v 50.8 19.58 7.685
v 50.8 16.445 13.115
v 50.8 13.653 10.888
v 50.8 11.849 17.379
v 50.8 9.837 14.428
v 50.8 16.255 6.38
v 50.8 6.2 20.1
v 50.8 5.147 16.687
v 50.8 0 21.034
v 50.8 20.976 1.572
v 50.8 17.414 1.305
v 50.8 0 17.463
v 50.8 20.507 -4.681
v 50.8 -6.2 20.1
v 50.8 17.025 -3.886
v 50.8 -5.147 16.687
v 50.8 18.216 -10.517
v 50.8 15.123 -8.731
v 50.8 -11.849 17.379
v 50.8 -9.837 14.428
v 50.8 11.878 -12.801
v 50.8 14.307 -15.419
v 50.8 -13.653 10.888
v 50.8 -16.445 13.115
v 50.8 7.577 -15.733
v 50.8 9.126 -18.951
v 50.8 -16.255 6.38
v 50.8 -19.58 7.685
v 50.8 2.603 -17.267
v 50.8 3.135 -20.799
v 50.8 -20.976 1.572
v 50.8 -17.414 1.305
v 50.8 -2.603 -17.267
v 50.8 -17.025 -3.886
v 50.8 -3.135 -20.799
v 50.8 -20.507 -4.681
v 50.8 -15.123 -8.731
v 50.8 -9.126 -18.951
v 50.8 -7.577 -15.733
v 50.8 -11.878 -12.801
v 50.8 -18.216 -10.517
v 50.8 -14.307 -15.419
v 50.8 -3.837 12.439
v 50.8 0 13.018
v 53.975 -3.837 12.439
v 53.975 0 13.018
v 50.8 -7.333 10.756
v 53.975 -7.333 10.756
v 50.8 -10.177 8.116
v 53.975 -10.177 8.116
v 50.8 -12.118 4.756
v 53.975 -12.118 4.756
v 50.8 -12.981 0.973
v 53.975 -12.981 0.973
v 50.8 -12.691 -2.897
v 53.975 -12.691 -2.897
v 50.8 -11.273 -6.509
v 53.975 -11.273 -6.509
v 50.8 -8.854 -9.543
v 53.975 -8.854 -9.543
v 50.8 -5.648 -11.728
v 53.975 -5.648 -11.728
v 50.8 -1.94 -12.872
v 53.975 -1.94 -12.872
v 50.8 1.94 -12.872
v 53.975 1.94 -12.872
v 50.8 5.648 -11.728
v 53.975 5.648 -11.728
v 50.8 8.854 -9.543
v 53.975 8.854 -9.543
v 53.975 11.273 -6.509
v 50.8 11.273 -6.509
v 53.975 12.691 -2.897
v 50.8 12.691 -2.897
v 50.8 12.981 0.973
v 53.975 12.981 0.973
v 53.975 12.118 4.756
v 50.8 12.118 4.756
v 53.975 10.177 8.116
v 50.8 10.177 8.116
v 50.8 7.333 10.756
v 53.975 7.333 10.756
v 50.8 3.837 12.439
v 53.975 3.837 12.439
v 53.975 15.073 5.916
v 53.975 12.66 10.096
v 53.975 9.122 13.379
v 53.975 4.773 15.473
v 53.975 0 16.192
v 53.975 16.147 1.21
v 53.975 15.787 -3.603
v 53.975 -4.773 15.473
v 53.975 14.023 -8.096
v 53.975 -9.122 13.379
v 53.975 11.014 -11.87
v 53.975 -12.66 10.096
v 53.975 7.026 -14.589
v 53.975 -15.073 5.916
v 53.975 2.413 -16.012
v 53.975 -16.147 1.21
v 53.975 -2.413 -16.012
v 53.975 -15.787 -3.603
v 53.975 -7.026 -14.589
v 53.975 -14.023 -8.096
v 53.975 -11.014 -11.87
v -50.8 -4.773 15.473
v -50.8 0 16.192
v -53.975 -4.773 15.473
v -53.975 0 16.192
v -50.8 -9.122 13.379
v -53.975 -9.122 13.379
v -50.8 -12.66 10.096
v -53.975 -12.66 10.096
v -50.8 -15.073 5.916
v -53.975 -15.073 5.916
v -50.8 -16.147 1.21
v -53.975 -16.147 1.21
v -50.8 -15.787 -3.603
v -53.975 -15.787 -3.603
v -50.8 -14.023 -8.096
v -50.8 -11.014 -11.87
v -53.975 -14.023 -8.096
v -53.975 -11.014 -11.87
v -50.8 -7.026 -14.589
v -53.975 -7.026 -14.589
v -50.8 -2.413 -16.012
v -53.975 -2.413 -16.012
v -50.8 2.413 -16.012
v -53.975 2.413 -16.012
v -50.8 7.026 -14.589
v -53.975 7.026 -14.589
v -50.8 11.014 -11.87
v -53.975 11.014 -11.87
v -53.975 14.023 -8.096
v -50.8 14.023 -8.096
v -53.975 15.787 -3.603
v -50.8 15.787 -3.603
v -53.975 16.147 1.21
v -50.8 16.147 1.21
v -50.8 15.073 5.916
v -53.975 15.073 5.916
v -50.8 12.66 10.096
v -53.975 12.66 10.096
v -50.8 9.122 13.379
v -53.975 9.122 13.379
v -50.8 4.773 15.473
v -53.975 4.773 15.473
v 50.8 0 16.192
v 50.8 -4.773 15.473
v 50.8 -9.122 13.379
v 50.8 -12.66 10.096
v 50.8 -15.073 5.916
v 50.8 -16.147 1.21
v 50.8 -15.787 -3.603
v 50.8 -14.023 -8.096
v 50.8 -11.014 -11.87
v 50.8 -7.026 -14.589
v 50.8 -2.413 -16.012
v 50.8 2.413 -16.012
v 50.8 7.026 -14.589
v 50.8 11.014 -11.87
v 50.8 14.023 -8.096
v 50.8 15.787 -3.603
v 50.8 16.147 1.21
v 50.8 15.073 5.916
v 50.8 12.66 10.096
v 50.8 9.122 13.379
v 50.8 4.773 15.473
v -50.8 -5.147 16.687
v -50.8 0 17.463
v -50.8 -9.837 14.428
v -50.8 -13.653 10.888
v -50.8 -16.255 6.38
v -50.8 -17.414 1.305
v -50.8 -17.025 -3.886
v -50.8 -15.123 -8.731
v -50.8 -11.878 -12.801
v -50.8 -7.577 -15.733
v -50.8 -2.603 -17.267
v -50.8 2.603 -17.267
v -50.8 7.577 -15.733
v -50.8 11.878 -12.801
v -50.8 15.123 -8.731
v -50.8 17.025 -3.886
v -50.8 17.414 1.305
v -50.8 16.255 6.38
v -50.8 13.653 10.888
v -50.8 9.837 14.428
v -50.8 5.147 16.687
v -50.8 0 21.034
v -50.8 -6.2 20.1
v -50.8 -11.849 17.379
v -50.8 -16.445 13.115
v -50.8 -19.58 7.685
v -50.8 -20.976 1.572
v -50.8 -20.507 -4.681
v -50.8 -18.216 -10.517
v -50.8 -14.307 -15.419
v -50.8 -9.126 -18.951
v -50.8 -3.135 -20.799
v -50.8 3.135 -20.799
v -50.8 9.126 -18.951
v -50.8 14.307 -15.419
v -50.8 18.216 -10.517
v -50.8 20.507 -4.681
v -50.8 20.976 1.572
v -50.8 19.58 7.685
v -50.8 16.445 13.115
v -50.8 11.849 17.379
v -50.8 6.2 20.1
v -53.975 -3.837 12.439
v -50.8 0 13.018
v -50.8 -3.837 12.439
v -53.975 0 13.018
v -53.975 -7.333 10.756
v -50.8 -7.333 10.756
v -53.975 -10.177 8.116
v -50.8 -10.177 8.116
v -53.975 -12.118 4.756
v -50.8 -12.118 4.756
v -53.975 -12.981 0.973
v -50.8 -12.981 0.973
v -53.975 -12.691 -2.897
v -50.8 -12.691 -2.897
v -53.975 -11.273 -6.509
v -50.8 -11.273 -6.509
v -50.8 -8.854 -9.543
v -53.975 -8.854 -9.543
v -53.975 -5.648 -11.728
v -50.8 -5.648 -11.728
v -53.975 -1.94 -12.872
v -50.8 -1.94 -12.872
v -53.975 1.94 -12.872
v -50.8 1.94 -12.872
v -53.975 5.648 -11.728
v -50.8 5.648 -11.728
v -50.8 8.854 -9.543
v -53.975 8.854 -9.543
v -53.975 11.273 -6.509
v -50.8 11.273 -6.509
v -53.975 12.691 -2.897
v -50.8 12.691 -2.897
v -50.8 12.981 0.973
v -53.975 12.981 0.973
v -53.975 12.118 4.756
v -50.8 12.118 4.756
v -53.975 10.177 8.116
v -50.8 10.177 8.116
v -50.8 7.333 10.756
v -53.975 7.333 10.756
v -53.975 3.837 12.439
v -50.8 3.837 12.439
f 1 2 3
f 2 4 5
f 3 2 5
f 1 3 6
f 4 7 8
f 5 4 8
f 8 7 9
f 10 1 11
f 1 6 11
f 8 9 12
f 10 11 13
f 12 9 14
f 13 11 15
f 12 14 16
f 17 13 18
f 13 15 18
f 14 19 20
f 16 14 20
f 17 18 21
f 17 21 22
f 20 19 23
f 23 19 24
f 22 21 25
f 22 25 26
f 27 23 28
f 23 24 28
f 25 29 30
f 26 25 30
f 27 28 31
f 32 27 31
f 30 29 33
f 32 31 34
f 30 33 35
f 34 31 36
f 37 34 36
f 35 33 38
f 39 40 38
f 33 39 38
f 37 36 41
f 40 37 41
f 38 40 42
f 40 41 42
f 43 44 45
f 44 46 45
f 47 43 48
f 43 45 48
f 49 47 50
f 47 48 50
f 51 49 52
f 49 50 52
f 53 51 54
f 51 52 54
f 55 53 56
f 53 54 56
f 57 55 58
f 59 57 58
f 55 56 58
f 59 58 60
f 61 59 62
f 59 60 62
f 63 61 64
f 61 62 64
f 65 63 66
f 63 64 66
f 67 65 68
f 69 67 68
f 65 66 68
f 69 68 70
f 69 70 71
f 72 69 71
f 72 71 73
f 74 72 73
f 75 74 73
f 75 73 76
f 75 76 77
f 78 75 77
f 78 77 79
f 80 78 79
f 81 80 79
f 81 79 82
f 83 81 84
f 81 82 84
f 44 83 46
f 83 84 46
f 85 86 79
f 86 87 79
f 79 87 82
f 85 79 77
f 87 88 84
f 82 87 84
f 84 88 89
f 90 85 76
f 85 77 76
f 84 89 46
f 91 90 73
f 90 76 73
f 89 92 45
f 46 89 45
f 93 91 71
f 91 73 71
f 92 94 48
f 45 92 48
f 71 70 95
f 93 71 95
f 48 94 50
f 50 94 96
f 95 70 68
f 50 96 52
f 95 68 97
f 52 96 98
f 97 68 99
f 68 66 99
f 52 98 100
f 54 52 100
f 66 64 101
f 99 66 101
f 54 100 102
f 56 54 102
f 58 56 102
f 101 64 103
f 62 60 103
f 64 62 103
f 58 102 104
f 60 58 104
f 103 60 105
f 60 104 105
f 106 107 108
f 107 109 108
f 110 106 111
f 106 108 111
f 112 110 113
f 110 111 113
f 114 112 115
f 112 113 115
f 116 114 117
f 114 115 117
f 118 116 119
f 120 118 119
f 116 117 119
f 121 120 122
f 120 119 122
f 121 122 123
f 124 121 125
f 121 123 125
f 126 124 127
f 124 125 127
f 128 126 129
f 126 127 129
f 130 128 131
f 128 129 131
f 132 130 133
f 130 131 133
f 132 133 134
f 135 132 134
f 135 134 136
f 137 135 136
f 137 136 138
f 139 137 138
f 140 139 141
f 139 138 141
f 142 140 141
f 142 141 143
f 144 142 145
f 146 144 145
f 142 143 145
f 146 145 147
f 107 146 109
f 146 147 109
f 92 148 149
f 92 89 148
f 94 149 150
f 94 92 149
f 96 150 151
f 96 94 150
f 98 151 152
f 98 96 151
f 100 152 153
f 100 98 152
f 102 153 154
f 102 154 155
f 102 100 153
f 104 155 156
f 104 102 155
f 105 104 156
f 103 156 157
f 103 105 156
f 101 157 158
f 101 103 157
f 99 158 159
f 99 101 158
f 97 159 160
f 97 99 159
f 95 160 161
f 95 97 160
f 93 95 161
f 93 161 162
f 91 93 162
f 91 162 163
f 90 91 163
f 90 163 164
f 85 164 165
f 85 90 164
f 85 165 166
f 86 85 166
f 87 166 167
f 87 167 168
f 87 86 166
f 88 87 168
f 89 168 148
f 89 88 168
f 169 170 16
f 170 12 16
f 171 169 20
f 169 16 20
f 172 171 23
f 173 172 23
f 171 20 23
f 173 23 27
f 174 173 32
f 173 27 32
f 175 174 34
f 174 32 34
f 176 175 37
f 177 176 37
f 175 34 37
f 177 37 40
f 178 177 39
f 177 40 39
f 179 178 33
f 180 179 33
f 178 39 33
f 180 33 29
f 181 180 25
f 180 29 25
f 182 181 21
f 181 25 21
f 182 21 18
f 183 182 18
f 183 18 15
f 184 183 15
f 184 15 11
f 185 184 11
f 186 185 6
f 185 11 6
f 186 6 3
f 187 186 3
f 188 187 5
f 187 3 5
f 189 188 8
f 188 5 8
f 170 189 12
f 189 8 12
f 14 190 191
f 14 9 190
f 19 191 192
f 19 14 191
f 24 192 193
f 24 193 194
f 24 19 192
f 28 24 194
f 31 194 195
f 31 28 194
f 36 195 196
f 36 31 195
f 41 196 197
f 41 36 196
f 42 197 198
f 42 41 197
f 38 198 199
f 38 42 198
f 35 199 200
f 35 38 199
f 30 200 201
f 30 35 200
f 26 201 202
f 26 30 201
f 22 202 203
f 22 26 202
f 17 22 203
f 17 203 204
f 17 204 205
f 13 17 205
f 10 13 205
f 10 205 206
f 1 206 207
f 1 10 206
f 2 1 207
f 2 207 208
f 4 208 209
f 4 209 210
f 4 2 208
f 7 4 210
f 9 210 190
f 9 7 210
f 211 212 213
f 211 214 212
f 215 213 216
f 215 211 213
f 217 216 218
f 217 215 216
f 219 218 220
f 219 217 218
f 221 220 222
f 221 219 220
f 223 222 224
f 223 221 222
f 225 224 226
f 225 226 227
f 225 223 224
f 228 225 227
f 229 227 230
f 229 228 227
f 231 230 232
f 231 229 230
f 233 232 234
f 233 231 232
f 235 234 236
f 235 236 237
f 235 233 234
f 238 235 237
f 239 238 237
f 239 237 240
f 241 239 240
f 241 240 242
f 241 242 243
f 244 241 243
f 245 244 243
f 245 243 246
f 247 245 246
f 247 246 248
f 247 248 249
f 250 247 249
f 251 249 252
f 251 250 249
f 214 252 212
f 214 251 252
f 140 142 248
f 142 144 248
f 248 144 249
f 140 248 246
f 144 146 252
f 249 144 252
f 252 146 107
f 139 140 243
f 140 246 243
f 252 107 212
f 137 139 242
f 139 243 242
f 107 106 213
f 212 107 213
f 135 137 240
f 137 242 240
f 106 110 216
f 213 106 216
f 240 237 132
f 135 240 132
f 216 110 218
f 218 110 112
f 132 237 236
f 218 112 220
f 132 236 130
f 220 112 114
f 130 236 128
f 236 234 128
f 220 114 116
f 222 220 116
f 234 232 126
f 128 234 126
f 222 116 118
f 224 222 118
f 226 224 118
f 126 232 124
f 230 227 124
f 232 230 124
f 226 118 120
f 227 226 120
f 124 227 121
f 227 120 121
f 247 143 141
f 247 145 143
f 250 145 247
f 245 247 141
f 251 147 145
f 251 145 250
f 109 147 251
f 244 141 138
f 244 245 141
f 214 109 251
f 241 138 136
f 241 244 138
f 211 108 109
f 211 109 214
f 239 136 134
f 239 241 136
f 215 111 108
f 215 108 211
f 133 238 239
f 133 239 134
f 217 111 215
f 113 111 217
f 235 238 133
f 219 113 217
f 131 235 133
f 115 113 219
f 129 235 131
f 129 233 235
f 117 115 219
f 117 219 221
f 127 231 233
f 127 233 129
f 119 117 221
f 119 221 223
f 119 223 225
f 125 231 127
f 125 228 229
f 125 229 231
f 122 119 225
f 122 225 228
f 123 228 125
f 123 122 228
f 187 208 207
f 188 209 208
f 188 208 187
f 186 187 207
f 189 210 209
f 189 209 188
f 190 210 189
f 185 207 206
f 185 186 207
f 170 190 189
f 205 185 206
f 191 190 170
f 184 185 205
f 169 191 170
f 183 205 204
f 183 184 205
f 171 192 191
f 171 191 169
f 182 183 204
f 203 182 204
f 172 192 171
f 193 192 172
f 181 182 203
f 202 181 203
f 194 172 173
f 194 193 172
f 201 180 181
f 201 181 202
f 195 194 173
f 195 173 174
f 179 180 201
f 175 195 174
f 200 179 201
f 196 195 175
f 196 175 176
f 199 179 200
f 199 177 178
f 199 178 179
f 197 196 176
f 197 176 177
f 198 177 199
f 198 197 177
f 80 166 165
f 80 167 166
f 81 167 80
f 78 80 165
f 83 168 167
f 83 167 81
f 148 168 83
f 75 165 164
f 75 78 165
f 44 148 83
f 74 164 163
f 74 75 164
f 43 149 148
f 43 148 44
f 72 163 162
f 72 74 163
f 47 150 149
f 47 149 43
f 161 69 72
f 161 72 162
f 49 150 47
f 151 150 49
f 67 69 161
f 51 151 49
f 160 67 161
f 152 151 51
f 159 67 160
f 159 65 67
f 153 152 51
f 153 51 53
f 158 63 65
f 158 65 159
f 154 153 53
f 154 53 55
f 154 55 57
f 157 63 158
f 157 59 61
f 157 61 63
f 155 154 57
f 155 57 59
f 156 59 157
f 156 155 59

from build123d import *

# Parameters (mm, degrees)
SKETCH1_W = 101.6
SKETCH1_H = 3.571875
SKETCH2_W = 3.175
SKETCH2_H = 3.175


with BuildPart() as part:
    # Sketch1 → Revolve1 (revolve)
    with BuildSketch(Plane.XY, mode=Mode.PRIVATE) as revolve1_sk:
        with Locations((0, 19.2484375)):
            Rectangle(SKETCH1_W, SKETCH1_H)
    revolve(revolve1_sk.sketch.rotate(Axis((-50.8, 0, 0), (1, 0, 0)), 90), axis=Axis((-50.8, 0, 0), (1, 0, 0)))


with BuildPart() as body_2:
    # Sketch2 → Revolve2 (revolve)
    with BuildSketch(Plane.XY, mode=Mode.PRIVATE) as revolve2_sk:
        with Locations((52.3875, 14.605)):
            Rectangle(SKETCH2_W, SKETCH2_H)
    revolve(revolve2_sk.sketch.rotate(Axis((50.8, 0, 0), (1, 0, 0)), 90), axis=Axis((50.8, 0, 0), (1, 0, 0)))


with BuildPart() as body_3:
    # Mirror2: mirrored copy
    add(body_2.part.mirror(Plane(origin=(0, 0, 0), x_dir=(0, 0, 1), z_dir=(1, 0, 0))))


solid = Compound([part.part, body_2.part, body_3.part])
